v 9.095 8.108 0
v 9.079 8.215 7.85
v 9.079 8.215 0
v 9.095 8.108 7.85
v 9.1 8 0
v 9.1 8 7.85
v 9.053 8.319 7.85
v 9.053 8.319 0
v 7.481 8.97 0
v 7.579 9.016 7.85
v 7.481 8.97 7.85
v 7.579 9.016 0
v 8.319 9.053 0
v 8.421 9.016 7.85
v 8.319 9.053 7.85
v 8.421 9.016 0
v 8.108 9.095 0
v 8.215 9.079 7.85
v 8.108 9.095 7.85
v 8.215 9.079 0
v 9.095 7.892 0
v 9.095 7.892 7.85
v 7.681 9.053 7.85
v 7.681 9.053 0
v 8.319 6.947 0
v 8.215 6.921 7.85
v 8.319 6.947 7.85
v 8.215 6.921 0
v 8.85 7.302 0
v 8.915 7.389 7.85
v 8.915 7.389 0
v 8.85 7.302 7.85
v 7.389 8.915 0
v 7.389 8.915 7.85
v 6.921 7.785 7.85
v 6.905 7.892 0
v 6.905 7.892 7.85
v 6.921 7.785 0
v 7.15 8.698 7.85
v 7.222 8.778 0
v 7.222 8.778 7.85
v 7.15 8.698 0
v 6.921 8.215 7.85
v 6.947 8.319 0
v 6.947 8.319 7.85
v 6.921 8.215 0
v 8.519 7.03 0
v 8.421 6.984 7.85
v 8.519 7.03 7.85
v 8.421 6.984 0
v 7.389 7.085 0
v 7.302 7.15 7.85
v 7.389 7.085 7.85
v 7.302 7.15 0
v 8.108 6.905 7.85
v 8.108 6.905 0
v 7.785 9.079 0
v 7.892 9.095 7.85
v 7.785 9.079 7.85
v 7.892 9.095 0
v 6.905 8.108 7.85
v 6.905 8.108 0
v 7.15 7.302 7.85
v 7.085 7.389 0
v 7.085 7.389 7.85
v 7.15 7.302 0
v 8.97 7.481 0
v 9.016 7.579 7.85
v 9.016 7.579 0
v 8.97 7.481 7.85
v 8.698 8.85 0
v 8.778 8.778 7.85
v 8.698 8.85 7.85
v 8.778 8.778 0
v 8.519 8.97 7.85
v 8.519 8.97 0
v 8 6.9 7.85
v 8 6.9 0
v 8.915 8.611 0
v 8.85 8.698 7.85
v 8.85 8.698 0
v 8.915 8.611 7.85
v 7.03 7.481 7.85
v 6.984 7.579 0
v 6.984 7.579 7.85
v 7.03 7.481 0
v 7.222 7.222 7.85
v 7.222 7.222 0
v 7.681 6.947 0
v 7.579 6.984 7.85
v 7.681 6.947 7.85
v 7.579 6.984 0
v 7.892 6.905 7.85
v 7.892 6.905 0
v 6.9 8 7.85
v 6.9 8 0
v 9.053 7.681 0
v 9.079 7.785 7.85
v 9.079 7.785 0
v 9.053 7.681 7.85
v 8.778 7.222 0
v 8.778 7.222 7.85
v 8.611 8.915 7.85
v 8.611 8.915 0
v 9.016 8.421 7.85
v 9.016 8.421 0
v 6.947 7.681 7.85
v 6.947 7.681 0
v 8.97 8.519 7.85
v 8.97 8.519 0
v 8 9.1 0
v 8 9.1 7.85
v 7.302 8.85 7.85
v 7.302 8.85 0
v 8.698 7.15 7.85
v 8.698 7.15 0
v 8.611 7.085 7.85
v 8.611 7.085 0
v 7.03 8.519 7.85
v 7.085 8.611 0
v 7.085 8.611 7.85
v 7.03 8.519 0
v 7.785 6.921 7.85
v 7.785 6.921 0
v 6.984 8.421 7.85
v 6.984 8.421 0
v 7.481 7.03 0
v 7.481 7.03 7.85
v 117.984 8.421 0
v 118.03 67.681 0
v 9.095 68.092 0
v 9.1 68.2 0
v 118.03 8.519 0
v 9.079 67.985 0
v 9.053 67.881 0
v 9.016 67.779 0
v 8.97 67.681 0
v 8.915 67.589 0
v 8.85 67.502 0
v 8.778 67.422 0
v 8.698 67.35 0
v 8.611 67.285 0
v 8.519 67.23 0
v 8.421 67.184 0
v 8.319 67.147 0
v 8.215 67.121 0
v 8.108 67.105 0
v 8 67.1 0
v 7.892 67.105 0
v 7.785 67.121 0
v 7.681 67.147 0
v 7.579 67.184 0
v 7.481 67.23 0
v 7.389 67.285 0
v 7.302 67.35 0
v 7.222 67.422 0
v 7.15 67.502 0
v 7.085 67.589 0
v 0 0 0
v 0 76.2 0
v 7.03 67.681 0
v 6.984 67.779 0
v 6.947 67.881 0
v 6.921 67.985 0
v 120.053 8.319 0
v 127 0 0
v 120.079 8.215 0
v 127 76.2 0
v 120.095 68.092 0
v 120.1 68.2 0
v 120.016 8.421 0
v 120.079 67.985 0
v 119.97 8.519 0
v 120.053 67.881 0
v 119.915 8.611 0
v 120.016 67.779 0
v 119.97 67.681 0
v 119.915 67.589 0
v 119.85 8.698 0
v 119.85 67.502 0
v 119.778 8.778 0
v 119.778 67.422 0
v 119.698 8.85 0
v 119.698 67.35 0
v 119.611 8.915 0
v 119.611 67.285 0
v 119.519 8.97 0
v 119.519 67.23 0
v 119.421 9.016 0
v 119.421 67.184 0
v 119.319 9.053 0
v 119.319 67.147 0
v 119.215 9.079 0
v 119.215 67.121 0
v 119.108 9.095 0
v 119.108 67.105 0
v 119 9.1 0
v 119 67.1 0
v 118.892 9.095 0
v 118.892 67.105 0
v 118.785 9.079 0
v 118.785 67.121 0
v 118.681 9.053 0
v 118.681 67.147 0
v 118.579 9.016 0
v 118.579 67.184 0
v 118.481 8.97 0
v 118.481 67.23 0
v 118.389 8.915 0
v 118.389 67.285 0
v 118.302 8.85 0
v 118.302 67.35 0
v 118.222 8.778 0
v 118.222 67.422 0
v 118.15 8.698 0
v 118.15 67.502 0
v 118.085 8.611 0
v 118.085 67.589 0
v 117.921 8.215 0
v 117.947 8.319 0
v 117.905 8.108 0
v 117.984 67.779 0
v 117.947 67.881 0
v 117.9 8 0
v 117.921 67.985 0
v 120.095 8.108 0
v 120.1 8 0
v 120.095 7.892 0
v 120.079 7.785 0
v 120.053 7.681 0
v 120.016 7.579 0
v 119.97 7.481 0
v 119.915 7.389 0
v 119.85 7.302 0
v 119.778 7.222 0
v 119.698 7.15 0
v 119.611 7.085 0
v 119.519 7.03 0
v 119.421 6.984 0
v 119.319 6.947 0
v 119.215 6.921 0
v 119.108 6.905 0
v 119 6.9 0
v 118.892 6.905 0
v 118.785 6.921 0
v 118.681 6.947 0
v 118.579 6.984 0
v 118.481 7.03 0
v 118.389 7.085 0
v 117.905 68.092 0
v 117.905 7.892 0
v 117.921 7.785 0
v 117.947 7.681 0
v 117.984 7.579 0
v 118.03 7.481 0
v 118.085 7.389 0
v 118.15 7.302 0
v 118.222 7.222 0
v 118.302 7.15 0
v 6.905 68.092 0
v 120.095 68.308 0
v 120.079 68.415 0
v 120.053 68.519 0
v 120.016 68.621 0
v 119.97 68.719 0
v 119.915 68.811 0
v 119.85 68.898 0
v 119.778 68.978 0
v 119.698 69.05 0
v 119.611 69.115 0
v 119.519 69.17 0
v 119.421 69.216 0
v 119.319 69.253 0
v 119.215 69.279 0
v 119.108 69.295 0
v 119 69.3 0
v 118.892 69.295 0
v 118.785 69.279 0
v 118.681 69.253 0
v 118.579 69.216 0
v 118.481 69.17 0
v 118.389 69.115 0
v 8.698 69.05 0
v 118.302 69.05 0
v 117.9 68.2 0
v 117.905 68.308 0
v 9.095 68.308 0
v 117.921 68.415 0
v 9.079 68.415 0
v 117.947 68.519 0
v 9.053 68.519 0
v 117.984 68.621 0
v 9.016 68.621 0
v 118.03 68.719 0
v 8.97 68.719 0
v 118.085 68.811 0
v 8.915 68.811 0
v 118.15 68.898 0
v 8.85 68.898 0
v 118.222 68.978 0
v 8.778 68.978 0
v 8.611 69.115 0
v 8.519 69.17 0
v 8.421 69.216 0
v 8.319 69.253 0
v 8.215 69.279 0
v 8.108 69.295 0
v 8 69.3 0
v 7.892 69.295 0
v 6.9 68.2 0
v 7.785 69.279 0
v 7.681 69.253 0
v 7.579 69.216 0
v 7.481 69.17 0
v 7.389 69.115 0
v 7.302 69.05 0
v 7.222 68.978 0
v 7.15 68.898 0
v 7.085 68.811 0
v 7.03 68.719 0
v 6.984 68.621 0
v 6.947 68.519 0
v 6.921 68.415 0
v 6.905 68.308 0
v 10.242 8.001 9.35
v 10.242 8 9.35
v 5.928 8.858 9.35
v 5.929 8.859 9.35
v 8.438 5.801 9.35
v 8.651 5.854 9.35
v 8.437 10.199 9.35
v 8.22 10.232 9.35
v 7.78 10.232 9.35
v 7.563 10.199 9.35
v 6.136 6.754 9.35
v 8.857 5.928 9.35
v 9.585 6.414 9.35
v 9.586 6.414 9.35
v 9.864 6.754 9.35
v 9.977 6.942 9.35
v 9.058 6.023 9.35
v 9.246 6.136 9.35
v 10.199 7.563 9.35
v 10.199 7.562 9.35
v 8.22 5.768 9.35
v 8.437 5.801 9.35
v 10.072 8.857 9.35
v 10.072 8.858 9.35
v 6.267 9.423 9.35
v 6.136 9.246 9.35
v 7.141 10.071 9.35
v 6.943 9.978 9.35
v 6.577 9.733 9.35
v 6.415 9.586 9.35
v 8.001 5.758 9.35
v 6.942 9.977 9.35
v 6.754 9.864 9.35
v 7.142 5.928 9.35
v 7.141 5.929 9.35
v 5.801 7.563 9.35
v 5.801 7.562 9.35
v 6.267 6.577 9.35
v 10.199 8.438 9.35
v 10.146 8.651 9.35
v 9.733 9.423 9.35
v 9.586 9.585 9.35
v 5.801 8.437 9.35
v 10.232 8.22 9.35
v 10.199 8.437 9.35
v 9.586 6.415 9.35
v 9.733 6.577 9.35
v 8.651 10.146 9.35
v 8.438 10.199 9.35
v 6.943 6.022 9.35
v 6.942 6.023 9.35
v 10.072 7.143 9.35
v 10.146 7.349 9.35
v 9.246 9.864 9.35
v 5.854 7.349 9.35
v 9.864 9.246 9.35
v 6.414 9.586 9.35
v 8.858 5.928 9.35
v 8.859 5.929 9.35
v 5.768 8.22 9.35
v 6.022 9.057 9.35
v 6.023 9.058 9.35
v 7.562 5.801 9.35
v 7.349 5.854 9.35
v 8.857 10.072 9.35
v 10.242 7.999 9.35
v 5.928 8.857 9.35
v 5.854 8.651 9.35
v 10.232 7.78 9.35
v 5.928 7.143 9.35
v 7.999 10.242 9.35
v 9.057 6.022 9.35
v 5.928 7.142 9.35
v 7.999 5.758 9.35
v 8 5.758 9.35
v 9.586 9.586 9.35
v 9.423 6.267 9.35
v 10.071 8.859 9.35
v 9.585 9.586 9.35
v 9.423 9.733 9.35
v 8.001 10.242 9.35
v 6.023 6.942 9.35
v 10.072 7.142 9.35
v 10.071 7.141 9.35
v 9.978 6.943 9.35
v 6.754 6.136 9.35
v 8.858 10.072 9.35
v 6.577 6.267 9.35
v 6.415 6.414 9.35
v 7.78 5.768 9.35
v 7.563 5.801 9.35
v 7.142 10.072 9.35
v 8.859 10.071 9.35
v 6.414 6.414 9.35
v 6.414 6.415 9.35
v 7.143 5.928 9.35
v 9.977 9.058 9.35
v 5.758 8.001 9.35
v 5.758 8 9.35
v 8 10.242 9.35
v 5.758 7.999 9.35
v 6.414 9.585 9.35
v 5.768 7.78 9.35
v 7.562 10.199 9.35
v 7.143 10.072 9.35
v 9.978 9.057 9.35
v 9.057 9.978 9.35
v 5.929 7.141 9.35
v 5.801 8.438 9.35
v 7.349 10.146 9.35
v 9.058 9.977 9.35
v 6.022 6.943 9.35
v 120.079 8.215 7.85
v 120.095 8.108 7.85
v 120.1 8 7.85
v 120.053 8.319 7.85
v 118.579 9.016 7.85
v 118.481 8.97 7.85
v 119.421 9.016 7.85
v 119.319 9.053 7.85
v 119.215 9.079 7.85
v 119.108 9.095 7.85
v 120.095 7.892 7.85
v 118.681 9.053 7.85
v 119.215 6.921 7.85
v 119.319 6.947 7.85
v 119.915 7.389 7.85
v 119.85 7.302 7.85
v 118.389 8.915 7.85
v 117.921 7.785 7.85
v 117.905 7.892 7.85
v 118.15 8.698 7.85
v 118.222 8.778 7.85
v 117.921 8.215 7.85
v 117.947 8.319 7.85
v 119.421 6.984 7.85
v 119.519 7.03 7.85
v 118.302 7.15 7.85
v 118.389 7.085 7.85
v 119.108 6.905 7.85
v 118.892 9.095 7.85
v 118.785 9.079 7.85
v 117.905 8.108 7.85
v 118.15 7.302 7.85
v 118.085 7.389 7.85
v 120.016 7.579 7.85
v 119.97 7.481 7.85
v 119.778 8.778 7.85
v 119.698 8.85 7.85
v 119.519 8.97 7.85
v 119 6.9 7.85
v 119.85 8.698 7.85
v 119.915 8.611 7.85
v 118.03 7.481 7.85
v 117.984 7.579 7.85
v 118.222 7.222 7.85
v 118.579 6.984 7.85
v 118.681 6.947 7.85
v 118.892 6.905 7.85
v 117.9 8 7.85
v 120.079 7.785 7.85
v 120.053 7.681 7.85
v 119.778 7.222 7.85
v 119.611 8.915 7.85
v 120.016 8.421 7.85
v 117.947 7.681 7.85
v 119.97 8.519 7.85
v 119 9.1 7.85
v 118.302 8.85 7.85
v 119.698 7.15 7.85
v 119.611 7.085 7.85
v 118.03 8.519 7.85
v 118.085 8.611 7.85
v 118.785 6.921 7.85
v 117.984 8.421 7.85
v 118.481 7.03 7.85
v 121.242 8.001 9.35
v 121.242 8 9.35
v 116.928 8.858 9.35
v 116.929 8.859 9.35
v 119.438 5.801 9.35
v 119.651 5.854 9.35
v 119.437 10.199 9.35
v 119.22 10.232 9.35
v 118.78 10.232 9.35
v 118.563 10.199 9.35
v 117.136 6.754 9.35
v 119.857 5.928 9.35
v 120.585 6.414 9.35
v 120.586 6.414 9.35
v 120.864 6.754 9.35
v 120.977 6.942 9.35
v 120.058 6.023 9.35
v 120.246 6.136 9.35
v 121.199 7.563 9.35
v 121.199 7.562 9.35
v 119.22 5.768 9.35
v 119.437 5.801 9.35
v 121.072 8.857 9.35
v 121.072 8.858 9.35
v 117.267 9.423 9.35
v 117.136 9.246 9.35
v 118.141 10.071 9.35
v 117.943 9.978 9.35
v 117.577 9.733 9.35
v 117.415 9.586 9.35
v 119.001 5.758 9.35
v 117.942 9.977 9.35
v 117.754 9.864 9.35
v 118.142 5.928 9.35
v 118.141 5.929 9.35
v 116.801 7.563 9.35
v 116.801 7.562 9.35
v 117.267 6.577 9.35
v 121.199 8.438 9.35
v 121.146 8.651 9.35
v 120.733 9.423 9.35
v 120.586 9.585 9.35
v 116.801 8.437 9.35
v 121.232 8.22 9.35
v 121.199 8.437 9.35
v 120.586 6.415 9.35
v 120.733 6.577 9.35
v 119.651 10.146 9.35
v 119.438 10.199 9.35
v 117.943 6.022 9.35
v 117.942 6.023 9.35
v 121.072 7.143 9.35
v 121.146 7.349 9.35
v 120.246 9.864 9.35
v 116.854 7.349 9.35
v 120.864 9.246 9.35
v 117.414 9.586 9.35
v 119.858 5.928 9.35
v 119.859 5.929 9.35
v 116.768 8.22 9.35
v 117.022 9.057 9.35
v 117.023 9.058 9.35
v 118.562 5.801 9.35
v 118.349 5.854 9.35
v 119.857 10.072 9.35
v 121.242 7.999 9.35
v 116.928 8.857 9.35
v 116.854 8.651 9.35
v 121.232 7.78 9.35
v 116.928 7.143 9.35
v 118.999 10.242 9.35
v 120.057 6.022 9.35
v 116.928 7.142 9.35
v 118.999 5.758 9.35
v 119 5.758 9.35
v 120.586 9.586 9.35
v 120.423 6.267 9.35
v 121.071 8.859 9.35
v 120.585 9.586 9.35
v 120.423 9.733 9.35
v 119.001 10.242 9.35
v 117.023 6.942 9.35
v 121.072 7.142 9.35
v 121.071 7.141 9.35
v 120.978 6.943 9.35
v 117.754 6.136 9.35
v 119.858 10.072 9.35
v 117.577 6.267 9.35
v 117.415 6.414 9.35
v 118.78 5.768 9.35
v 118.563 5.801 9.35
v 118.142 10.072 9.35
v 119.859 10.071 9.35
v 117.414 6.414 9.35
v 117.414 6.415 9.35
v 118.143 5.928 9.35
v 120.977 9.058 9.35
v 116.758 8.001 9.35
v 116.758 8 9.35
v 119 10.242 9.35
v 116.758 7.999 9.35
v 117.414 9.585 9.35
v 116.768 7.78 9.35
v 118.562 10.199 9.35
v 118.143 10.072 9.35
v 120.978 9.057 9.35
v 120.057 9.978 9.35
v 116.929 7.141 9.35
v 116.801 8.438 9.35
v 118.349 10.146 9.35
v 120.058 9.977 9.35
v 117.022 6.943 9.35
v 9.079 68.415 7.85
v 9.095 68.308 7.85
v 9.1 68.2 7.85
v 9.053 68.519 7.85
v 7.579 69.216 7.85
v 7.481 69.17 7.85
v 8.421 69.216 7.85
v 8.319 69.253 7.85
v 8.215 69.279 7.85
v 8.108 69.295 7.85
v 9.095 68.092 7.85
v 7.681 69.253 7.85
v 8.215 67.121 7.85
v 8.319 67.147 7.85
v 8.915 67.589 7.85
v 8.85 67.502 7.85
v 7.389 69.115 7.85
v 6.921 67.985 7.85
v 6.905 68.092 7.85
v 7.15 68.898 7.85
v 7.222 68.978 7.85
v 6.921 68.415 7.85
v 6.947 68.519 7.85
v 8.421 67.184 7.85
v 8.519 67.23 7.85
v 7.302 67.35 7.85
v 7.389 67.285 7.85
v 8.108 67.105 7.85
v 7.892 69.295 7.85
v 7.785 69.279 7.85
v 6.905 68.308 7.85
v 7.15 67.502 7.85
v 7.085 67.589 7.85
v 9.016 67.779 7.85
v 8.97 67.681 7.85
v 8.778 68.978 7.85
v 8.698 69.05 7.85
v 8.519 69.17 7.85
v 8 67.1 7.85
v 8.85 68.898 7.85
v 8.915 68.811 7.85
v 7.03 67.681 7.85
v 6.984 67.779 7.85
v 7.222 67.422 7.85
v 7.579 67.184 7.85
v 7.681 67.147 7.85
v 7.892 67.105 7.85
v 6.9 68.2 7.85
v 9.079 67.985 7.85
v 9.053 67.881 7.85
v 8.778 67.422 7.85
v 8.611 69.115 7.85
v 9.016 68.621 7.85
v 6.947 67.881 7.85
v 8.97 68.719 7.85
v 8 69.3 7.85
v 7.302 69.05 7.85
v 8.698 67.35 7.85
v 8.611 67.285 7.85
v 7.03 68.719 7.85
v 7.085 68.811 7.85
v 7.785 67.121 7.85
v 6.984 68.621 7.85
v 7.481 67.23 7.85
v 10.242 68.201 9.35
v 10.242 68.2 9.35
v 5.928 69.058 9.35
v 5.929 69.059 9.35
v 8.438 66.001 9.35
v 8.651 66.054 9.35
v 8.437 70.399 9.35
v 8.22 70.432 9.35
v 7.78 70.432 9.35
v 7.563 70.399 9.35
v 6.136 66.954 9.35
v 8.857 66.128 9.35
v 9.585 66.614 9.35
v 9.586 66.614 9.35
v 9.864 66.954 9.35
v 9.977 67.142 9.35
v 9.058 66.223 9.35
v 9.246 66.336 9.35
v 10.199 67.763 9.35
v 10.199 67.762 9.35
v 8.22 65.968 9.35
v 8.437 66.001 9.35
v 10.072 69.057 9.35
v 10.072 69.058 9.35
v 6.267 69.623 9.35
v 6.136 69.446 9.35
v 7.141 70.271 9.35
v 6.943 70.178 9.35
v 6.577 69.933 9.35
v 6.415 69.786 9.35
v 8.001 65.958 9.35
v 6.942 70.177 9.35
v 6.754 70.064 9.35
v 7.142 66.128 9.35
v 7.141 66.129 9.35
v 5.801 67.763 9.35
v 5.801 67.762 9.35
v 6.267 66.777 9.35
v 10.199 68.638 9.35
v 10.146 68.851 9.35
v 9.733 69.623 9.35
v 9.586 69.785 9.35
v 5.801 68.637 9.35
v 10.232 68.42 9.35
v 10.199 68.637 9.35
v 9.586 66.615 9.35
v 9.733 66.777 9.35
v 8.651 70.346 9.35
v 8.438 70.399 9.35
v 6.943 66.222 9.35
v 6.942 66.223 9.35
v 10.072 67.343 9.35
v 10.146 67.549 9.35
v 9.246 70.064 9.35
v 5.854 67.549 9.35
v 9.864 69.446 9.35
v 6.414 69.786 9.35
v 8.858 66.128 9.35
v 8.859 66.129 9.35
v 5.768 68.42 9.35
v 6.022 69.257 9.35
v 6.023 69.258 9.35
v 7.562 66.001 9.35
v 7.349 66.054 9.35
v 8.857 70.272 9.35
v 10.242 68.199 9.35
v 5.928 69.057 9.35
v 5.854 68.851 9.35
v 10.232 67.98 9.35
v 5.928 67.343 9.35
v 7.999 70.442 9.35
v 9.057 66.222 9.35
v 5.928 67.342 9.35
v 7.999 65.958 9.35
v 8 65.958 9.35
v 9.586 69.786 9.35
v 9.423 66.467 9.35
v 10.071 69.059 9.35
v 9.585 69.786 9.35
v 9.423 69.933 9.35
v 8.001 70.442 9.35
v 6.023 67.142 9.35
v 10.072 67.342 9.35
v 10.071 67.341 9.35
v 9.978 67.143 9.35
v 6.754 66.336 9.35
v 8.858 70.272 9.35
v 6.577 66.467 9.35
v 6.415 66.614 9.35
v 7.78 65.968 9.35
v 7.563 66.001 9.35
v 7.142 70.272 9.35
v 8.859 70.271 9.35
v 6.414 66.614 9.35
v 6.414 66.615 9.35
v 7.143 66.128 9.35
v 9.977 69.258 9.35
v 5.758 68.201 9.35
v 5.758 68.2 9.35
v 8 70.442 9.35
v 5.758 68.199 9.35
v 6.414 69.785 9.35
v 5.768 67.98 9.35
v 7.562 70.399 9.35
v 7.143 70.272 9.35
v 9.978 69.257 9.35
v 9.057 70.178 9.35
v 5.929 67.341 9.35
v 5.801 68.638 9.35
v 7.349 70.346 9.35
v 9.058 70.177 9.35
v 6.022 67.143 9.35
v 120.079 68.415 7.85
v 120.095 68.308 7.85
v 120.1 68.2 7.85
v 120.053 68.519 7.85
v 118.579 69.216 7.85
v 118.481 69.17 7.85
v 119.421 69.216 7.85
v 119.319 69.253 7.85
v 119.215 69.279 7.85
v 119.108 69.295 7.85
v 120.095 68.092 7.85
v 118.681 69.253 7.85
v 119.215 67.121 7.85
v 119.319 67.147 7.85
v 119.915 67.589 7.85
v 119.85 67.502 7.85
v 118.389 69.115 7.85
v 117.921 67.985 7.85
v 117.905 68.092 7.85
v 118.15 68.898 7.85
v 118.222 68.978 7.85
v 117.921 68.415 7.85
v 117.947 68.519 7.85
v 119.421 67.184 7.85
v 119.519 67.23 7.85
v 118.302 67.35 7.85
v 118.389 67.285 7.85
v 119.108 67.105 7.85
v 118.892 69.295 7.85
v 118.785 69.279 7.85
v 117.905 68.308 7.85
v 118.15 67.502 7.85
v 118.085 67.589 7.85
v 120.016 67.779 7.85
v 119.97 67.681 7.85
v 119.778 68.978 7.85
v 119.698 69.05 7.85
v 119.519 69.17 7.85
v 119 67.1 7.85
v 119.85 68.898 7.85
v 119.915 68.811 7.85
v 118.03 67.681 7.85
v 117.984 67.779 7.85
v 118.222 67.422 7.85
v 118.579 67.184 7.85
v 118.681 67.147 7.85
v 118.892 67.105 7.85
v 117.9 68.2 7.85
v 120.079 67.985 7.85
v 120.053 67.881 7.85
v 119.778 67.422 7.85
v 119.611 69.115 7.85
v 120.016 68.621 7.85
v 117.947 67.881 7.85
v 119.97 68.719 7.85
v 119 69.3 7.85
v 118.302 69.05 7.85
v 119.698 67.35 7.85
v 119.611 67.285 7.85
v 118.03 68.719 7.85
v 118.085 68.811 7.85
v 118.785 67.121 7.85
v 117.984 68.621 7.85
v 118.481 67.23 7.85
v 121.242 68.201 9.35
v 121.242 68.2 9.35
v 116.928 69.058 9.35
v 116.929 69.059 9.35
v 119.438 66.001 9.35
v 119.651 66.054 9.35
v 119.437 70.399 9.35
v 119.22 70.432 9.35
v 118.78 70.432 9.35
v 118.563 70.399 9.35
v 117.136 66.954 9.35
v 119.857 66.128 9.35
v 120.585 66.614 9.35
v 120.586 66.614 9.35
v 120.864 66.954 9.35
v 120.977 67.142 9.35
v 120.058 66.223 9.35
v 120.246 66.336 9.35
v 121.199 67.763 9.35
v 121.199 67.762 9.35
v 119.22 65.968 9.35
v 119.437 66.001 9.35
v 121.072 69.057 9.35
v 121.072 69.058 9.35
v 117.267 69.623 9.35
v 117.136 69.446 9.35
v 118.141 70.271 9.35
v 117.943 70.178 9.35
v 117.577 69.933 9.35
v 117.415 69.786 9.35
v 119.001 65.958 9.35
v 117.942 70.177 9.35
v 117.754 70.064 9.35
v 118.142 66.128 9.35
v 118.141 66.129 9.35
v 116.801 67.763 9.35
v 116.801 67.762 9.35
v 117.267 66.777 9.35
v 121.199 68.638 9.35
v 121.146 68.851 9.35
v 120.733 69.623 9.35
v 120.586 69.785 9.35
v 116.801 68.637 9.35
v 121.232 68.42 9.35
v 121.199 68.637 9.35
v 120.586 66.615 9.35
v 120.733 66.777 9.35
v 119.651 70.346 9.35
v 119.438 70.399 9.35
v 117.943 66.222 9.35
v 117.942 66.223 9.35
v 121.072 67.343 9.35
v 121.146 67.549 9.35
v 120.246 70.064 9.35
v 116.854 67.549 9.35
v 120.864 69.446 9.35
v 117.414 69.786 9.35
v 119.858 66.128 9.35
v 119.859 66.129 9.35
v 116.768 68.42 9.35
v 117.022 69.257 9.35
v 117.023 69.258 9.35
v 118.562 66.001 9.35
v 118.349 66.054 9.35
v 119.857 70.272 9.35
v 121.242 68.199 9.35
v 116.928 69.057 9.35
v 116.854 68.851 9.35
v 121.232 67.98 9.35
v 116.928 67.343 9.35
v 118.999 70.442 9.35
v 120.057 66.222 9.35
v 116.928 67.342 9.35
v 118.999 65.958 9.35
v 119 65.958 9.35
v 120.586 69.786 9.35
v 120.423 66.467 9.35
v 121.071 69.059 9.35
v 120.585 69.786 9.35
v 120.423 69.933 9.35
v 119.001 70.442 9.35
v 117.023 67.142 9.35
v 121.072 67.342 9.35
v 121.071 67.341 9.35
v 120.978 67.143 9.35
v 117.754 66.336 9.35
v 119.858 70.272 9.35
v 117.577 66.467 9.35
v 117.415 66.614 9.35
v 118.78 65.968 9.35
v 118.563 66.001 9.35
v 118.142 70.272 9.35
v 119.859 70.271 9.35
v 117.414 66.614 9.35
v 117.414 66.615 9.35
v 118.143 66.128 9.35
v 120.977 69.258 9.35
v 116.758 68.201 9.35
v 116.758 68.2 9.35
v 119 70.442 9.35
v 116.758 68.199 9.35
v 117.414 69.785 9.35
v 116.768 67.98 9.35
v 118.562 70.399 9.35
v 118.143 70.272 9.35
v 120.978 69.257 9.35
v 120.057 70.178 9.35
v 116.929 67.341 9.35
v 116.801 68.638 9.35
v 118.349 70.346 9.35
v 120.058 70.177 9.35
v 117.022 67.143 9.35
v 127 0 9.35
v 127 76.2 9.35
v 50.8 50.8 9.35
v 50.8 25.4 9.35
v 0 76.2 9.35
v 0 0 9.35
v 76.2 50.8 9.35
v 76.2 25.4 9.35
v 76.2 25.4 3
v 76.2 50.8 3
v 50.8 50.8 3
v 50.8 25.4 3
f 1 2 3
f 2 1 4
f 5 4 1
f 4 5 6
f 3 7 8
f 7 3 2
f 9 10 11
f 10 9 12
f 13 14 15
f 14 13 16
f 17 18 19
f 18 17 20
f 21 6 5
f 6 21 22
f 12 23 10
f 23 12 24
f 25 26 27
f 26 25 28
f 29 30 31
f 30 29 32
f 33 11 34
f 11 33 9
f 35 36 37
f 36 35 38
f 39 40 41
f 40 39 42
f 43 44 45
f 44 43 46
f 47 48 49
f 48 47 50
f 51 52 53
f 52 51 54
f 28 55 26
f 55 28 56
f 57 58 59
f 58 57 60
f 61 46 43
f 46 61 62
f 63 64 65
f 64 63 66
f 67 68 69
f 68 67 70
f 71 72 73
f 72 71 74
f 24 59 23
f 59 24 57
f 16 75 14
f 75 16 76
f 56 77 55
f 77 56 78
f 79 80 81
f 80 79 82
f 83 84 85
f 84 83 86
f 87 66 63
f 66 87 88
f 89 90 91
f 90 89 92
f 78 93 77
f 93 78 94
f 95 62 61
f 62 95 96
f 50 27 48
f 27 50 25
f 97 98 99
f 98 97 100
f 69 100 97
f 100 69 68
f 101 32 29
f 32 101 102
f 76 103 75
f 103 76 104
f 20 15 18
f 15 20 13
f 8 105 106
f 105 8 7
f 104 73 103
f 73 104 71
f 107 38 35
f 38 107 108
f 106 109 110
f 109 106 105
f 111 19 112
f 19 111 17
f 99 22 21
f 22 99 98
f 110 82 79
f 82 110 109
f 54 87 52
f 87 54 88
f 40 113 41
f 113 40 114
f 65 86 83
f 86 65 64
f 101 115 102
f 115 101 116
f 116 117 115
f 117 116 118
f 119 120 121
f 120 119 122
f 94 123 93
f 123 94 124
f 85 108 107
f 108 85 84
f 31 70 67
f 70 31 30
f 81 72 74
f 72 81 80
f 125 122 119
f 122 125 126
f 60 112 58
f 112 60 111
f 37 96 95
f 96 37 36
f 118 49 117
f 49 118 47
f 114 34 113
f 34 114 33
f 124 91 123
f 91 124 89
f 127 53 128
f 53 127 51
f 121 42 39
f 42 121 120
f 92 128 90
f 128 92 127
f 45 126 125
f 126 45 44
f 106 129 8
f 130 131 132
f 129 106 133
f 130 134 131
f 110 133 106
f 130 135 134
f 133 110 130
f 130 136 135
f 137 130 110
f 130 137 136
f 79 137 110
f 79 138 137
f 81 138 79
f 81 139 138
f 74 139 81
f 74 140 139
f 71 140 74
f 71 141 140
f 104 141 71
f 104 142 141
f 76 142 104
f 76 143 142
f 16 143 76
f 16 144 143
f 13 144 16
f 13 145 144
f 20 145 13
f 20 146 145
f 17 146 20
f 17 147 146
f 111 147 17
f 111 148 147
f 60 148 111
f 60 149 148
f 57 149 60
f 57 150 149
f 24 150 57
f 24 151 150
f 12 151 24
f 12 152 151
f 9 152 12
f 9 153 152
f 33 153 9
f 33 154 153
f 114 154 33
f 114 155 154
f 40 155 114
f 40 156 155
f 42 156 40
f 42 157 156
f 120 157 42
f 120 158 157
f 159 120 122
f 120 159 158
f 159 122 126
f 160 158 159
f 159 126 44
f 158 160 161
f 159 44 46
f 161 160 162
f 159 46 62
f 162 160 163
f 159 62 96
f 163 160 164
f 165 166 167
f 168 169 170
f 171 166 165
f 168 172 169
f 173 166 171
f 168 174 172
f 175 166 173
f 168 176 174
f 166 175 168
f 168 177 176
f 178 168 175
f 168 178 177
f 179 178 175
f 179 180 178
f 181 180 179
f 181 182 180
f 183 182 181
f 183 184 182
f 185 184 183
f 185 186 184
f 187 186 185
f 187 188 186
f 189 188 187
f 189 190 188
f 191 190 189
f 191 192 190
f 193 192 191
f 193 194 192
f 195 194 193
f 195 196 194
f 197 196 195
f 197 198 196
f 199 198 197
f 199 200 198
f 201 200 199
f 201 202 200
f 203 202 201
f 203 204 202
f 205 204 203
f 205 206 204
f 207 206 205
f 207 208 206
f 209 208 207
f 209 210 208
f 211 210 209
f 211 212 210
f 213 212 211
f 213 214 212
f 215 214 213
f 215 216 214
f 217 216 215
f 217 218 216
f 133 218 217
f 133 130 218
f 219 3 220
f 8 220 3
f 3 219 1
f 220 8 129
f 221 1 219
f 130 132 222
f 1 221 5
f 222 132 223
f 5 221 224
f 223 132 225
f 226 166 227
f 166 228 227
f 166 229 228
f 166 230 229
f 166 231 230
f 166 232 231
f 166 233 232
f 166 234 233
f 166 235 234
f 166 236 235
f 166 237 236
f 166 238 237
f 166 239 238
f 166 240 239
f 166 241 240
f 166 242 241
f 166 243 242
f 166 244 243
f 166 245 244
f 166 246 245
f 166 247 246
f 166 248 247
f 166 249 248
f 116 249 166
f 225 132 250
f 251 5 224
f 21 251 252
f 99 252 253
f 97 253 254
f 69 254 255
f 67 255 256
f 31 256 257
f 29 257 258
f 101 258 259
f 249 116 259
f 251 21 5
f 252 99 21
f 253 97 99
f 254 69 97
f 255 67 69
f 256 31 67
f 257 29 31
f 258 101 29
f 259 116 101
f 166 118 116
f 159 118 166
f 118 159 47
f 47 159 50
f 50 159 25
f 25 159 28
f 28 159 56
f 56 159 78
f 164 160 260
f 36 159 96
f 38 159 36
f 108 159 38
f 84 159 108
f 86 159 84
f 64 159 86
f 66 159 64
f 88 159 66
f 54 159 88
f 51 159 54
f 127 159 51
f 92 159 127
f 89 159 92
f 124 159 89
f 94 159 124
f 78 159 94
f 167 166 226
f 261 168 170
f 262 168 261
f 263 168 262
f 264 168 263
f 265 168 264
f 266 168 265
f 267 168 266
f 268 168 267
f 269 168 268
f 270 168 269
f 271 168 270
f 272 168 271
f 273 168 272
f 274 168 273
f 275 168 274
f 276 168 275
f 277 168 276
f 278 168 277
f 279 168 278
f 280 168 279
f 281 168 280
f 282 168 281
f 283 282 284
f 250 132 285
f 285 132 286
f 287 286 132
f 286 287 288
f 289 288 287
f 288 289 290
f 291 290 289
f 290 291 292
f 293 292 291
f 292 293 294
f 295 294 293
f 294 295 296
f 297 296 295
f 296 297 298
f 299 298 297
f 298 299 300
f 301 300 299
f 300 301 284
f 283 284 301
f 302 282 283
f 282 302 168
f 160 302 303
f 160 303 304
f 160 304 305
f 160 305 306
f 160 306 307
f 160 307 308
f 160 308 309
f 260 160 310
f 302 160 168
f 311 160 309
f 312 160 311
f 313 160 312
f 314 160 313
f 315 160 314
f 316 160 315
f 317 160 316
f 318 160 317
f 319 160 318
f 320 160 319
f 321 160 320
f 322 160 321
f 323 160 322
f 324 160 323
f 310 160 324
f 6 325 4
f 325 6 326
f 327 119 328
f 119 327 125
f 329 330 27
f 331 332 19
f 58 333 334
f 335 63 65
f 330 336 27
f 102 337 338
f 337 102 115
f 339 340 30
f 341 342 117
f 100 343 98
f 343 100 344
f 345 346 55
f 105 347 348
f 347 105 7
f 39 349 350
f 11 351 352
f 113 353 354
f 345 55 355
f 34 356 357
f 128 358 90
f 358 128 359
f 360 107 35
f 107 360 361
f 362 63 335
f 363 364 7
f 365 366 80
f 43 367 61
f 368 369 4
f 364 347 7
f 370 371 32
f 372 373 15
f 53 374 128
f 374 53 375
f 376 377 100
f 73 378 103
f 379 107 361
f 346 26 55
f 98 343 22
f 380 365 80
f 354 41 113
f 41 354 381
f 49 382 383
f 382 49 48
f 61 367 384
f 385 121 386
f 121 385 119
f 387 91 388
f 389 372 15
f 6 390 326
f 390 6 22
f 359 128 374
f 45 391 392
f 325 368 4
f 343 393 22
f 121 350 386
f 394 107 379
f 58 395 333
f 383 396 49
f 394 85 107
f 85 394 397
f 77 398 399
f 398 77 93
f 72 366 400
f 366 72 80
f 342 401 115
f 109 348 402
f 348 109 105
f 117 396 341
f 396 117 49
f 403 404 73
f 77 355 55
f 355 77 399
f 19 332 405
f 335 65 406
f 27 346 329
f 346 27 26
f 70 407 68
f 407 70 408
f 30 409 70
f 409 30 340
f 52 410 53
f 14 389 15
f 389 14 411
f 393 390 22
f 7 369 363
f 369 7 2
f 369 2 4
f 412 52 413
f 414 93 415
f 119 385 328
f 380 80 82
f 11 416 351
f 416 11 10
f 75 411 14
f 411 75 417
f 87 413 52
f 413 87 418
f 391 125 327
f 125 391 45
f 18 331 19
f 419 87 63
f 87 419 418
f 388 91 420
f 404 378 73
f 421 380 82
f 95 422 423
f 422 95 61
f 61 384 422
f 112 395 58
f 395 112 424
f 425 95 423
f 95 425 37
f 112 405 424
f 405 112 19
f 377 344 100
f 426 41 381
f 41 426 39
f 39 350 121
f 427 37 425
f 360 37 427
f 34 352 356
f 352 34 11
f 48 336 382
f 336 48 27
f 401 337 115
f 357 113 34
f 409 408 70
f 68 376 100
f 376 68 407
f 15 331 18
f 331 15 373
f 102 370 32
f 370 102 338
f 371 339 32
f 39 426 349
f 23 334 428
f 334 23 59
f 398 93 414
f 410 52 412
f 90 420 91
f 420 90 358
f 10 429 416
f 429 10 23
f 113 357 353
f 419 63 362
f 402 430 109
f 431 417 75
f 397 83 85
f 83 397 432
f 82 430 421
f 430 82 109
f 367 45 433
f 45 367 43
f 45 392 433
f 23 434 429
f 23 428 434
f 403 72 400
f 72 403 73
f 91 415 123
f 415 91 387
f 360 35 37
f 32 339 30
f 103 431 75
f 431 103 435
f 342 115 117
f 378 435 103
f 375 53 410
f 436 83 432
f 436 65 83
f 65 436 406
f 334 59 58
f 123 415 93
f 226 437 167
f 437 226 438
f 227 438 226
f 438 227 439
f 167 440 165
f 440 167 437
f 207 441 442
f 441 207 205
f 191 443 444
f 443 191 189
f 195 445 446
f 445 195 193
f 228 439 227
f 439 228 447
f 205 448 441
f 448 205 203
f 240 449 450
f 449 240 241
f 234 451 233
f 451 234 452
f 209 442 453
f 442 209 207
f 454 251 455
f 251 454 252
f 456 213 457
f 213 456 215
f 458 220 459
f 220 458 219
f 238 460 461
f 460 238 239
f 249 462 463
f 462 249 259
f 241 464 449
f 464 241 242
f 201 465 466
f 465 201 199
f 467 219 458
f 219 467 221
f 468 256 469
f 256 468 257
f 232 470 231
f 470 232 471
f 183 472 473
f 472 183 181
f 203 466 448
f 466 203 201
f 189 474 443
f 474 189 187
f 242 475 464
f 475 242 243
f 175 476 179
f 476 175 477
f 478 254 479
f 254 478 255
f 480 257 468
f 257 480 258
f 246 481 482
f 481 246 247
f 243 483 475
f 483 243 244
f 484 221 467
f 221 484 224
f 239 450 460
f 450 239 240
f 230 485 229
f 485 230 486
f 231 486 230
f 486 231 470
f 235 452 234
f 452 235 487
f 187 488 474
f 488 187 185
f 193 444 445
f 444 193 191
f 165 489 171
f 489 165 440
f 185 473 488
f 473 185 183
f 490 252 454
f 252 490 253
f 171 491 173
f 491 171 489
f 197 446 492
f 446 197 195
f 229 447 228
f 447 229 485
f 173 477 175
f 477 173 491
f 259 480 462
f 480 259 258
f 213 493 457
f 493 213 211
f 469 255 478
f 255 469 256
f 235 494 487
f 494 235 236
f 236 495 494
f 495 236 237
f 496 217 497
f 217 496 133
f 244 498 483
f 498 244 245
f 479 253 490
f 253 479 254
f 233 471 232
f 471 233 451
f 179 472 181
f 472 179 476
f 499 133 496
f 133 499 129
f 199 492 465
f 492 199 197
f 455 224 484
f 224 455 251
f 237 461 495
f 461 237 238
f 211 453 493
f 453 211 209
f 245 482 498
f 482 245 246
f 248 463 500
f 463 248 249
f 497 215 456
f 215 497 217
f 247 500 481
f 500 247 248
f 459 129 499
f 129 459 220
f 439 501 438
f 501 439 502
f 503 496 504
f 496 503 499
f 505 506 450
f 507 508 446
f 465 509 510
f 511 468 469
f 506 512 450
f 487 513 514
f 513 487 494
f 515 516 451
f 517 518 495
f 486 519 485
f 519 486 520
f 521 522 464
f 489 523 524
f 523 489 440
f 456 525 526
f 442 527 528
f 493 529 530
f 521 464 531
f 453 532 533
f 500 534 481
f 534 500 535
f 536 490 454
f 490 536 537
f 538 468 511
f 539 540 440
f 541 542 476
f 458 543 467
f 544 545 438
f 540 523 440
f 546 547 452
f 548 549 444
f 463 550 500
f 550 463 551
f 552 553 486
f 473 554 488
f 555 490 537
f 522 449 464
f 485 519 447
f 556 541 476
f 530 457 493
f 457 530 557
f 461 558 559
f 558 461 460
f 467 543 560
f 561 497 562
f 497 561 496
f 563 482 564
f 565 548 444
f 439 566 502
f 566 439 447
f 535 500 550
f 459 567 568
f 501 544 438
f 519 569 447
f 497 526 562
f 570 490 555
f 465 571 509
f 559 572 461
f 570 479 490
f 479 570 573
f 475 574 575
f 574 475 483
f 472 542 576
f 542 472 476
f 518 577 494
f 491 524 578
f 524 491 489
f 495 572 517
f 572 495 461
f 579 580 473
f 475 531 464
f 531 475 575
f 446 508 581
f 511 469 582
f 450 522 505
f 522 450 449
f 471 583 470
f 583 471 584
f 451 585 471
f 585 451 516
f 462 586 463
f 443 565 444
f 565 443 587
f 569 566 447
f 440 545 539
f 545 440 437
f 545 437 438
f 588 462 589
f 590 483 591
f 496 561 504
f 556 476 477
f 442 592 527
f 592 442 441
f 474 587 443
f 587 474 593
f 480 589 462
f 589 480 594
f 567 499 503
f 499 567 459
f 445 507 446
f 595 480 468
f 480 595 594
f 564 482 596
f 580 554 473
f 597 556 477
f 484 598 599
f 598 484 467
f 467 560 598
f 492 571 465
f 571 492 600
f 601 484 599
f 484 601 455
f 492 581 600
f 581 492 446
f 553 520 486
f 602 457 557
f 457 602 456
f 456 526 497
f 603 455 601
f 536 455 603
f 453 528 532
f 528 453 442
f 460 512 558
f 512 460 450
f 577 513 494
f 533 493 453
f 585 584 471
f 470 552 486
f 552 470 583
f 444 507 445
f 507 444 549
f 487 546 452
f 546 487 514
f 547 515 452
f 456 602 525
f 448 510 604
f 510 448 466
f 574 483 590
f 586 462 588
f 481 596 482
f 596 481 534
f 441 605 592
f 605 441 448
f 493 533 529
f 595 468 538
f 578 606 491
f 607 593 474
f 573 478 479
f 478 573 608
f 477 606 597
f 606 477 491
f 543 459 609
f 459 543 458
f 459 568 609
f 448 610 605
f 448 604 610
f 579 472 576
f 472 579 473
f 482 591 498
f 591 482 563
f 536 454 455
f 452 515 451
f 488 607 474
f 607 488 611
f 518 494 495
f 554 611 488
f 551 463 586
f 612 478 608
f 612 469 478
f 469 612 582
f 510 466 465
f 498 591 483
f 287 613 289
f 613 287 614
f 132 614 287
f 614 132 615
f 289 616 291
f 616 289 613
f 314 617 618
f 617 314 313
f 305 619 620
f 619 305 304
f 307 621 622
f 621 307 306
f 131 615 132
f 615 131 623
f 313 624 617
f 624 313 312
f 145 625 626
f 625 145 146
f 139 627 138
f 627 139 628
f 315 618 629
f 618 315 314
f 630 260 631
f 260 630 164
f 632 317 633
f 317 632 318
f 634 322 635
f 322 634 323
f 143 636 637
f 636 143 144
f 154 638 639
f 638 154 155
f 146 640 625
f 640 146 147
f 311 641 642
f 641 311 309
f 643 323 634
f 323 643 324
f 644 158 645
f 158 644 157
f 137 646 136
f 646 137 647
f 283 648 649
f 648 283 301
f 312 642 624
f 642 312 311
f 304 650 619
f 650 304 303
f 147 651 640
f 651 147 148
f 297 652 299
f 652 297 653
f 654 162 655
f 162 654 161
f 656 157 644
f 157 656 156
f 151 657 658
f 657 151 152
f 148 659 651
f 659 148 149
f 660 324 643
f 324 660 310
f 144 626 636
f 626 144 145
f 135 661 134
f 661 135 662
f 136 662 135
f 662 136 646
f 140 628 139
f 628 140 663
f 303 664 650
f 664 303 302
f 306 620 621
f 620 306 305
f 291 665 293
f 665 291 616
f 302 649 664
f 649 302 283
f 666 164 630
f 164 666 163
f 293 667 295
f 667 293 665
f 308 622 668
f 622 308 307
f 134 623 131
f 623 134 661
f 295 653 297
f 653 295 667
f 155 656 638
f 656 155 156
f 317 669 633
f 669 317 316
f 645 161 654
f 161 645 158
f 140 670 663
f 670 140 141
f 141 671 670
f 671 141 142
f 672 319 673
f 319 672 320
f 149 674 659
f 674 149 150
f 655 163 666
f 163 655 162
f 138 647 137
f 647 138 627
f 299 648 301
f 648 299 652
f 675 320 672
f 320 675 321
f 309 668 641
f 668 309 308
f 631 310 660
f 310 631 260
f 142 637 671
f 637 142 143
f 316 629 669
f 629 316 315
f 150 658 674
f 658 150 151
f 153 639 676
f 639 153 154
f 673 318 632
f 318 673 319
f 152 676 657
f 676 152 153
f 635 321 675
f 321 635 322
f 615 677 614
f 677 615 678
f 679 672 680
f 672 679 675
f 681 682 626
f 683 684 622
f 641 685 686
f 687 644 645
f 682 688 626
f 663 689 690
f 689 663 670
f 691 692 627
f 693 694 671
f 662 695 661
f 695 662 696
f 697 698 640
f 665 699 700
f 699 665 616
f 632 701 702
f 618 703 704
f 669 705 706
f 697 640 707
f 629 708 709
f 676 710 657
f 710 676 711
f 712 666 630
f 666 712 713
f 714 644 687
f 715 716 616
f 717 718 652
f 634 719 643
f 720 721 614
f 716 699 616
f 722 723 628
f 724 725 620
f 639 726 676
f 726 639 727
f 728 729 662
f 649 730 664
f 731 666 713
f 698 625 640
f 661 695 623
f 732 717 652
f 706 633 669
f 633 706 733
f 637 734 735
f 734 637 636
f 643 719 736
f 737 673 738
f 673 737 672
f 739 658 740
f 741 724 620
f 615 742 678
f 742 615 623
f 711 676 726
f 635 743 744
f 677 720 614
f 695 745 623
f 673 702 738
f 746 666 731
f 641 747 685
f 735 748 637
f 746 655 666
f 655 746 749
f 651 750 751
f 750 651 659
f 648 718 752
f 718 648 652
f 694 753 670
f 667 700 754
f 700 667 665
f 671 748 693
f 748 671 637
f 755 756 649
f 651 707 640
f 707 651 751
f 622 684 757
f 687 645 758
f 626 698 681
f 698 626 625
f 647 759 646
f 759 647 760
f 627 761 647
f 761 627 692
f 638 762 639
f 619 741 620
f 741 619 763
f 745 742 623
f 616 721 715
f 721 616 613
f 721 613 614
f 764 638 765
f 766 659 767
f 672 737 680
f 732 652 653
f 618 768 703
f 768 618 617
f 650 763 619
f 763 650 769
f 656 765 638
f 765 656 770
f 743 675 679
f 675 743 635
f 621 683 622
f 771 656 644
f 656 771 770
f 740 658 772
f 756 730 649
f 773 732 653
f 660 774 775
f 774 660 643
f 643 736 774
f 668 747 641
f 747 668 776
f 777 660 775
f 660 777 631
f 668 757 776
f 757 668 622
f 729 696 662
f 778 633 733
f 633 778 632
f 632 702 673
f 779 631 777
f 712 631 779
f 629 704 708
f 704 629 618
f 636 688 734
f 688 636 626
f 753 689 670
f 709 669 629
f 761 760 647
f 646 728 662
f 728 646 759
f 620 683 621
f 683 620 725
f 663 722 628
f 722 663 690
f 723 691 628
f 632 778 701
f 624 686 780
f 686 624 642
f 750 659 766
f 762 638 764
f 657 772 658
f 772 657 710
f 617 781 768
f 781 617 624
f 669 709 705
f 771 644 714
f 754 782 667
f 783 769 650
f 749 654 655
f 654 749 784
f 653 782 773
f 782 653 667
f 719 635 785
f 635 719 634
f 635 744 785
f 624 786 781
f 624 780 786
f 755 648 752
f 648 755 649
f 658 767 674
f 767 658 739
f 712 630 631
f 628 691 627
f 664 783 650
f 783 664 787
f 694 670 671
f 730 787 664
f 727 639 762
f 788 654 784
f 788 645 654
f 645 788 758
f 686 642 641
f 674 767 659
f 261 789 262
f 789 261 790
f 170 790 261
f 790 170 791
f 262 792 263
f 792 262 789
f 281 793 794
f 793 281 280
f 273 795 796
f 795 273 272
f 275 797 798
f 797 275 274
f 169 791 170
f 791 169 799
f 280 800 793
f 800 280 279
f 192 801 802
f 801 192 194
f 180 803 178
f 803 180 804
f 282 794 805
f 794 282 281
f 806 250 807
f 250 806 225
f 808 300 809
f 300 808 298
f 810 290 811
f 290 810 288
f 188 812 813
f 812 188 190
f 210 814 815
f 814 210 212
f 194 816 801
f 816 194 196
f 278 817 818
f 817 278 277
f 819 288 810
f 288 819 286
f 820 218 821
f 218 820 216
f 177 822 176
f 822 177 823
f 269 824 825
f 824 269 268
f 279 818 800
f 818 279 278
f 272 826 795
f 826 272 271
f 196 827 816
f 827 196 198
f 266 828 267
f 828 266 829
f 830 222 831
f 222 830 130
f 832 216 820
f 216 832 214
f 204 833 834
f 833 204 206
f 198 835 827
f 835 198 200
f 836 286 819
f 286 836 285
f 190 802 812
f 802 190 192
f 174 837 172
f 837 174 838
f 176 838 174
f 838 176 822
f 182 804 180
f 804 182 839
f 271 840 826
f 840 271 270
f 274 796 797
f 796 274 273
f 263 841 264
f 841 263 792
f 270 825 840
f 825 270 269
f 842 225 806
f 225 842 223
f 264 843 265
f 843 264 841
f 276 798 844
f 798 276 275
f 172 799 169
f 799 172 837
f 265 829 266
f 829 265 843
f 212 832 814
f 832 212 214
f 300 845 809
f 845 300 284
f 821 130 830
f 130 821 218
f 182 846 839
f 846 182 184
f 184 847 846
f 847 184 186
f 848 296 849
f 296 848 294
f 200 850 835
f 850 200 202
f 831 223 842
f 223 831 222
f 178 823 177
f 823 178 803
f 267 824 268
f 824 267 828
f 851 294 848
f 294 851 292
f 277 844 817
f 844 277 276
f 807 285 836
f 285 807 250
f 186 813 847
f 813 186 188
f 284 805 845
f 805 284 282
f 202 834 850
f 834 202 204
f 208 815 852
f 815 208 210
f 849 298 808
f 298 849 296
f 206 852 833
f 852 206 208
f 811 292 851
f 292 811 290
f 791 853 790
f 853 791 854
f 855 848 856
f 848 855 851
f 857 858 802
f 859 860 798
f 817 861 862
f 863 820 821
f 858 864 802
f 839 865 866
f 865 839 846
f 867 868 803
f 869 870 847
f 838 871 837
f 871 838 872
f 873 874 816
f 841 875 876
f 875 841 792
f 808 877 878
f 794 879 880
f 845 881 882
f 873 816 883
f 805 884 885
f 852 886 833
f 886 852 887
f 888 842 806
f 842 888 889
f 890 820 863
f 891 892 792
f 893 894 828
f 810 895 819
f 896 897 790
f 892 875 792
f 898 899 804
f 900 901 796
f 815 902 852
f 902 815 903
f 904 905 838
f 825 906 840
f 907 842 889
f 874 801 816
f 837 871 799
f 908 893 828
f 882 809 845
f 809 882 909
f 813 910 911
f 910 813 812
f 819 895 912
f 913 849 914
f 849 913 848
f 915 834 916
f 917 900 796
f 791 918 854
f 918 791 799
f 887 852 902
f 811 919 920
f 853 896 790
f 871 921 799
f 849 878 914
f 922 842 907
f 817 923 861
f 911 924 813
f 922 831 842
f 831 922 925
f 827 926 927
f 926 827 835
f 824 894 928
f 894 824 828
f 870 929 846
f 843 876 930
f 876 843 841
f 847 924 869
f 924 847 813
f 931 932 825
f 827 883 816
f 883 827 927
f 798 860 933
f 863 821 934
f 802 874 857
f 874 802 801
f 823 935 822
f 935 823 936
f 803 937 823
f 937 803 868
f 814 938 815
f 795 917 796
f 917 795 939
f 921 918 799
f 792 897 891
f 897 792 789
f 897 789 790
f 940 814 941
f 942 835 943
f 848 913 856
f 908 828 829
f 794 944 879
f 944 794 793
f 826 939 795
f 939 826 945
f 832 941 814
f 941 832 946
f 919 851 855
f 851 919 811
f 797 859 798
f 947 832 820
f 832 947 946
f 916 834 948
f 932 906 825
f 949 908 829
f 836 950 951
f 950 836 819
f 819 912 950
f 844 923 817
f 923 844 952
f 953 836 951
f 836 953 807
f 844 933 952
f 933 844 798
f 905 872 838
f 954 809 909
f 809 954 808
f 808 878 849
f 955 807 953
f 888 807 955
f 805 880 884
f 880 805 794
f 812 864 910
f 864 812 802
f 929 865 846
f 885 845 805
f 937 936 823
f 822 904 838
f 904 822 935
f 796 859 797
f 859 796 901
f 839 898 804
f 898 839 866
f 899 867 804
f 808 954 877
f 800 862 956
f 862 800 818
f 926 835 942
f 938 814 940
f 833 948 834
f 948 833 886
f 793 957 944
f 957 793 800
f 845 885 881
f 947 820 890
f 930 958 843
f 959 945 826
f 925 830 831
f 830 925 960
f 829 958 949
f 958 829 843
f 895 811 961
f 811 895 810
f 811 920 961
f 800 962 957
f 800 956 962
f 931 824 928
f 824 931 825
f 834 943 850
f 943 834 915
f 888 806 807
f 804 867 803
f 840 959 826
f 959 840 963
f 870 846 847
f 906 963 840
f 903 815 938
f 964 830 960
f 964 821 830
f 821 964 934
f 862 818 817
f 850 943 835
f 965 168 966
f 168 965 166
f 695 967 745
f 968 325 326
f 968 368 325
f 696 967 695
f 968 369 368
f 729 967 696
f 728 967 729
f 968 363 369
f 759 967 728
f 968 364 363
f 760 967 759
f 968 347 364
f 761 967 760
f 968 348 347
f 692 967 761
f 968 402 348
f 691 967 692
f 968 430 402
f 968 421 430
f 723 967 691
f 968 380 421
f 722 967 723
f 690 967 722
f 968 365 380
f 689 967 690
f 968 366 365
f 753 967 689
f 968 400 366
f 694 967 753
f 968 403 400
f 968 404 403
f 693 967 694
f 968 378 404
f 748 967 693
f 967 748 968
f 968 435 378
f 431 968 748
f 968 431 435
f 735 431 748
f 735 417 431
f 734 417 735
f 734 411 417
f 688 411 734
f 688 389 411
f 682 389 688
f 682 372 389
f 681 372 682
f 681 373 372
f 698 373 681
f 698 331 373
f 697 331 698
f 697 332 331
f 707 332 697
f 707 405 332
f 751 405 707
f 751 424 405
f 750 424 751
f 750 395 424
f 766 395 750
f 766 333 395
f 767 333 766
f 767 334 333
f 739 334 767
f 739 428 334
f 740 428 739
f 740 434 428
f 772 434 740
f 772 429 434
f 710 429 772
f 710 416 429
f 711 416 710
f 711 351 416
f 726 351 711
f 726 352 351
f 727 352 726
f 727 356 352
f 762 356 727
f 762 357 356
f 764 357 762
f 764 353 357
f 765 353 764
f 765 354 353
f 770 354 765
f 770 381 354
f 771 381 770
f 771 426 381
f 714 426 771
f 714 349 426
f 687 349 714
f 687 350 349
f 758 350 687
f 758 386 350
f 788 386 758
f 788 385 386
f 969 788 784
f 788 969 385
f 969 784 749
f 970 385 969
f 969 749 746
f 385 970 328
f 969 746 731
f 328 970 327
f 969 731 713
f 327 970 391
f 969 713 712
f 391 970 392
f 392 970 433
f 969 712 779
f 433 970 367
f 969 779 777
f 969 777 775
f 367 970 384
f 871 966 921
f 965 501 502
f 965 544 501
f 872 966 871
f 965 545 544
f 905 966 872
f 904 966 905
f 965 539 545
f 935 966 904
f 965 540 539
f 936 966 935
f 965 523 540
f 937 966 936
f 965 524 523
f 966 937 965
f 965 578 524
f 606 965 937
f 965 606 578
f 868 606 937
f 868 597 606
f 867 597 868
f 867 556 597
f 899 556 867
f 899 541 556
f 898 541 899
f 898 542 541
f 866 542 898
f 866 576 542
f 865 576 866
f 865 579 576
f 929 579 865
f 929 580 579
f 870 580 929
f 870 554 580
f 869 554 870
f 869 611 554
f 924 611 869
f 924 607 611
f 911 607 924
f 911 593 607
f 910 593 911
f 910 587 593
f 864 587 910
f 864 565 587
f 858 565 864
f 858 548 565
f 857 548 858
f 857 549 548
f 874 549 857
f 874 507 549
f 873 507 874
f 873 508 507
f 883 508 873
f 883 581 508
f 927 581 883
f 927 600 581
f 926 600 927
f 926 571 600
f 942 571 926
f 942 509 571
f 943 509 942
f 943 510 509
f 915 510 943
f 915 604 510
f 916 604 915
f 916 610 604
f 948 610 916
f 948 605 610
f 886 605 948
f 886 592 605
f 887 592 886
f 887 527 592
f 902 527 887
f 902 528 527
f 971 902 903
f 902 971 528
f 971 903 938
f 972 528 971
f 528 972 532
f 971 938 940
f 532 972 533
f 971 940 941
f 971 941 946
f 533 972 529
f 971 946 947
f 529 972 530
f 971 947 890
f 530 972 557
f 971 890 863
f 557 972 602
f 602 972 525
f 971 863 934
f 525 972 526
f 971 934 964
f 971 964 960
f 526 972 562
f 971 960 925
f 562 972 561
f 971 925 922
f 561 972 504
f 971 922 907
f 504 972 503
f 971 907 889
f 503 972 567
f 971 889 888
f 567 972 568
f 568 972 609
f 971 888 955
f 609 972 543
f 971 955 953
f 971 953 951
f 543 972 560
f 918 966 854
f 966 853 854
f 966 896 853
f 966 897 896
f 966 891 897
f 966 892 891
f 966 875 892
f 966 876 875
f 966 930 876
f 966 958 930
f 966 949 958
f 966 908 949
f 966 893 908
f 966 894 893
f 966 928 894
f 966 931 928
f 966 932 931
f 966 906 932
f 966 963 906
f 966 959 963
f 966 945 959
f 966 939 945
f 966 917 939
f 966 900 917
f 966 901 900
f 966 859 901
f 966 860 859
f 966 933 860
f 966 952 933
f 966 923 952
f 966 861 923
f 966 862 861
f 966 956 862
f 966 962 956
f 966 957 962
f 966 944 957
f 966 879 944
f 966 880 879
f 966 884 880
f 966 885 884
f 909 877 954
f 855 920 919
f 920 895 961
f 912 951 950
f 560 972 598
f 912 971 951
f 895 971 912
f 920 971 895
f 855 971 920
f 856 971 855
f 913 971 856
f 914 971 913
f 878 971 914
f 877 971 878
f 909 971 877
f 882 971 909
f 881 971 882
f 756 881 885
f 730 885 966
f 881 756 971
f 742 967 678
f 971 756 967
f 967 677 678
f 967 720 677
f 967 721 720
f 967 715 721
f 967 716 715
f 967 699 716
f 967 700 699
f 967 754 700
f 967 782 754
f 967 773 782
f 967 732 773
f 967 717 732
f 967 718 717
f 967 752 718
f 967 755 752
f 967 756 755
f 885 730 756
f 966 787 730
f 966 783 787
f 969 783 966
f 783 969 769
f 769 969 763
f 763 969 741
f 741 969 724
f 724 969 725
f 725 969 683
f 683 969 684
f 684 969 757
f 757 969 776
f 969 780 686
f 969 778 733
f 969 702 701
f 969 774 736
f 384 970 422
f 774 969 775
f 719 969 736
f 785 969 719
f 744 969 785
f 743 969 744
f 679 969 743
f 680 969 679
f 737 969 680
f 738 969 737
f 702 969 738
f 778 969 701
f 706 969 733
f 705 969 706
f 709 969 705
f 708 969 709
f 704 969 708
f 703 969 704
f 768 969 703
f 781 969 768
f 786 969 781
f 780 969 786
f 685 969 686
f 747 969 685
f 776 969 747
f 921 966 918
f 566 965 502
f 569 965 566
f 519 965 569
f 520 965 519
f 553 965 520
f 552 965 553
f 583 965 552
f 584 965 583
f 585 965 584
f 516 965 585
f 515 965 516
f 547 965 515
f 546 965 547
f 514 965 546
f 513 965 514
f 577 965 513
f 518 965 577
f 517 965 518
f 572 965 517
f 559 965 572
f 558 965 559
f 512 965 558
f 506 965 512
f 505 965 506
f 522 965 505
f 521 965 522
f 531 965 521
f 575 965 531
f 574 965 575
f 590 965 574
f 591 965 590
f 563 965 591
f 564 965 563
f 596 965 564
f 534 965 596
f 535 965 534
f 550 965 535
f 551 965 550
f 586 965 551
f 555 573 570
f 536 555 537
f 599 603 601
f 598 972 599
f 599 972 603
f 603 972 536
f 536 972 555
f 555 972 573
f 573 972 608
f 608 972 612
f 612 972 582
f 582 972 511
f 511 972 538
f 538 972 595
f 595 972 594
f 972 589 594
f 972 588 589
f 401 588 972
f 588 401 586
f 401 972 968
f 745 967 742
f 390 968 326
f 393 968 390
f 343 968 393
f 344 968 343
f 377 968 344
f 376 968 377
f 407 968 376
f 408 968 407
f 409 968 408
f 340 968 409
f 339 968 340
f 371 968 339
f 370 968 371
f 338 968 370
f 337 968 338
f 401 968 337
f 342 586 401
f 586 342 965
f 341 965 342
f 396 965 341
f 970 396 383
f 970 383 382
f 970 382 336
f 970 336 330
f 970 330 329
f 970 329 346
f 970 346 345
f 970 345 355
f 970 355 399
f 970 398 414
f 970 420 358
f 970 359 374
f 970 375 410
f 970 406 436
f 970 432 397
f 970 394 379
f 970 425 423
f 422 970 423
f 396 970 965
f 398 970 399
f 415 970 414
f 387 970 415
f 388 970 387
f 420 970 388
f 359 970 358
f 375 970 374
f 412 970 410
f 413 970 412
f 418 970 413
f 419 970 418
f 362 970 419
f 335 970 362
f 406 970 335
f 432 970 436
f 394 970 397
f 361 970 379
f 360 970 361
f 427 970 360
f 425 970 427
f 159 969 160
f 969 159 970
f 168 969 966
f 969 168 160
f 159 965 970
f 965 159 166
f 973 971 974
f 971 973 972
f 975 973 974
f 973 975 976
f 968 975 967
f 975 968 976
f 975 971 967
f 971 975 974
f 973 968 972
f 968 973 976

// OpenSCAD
// file: params.scad
// =============================================================================
// imac-camera-rebirth — params.scad
// Shared parameters for all enclosure variants
// https://github.com/thisoldcpu/imac-camera-rebirth
// =============================================================================
// Module: Apple 820-2572-A (2009 iMac 27")
// =============================================================================

// -----------------------------------------------------------------------------
// PCB
// -----------------------------------------------------------------------------
pcb_l        = 50.00;   // length (X)
pcb_w        =  7.92;   // width (Y)
pcb_d        = 10.00;   // depth lens face to rear connector (Z)

// -----------------------------------------------------------------------------
// Lens barrel
// -----------------------------------------------------------------------------
lens_dia     =  7.50;   // barrel outer diameter
lens_x       = 25.00;   // center offset from PCB left edge (dead center)
lens_y       =  3.96;   // center offset from PCB bottom edge (PCB centerline)

// -----------------------------------------------------------------------------
// USB-C port cutout (rear, dead center)
// -----------------------------------------------------------------------------
usbc_w       =  9.00;   // USB-C receptacle width
usbc_h       =  3.26;   // USB-C receptacle height
usbc_x       = pcb_l / 2; // dead center on PCB length axis

// -----------------------------------------------------------------------------
// Wall and clearance
// -----------------------------------------------------------------------------
wall         =  2.00;   // minimum shell wall thickness
clearance    =  0.20;   // PCB pocket fit clearance (per side)
lens_clear   =  0.30;   // lens aperture clearance (radial)

// -----------------------------------------------------------------------------
// Derived — PCB pocket (do not edit)
// -----------------------------------------------------------------------------
pocket_l     = pcb_l + (clearance * 2);
pocket_w     = pcb_w + (clearance * 2);
pocket_d     = pcb_d + clearance;

// -----------------------------------------------------------------------------
// Obelisk body (top shell)
// -----------------------------------------------------------------------------
body_l       = pocket_l + (wall * 2);
body_w       = pocket_w + (wall * 2);
body_d       = pocket_d + wall;

// -----------------------------------------------------------------------------
// Top/bottom shell split
// -----------------------------------------------------------------------------
split_z      = body_d / 2;  // Z height of shell split plane

// -----------------------------------------------------------------------------
// Heatsink channel
// -----------------------------------------------------------------------------
hs_channel_w =  6.00;   // width of slim channel over HS pad
hs_channel_d =  1.00;   // depth of channel recess into top shell
// main file
// =============================================================================
// imac-camera-rebirth — obelisk_bottom.scad
// Bottom plate: 5"x3", blind center recess, chamfered M2 corner holes
// https://github.com/thisoldcpu/imac-camera-rebirth
// =============================================================================

include <params.scad>

$fn = 64;

ow         = 127.00;
od         =  76.20;
screw_in   =   8.00;

recess_w   =  25.40;  // 1"
recess_d   =  25.40;  // 1"
recess_h   =   6.35;  // 1/2" blind recess
wall_t     =   3.00;
plate_h    =  recess_h + wall_t;  // 9.35mm — recess + floor

chamfer_d  =   4.50;
chamfer_h  =   1.50;

module chamfered_hole(total_h) {
    cylinder(h=total_h, d=2.2);
    translate([0, 0, total_h - chamfer_h])
        cylinder(h=chamfer_h+0.01, d1=2.2, d2=chamfer_d);
}

module obelisk_bottom() {
    difference() {
        cube([ow, od, plate_h]);

        // Blind snap-in recess from top face down
        translate([ow/2 - recess_w/2, od/2 - recess_d/2, plate_h - recess_h])
            cube([recess_w, recess_d, recess_h + 0.01]);

        // Chamfered M2 holes
        translate([screw_in,    screw_in,    0]) chamfered_hole(plate_h);
        translate([ow-screw_in, screw_in,    0]) chamfered_hole(plate_h);
        translate([screw_in,    od-screw_in, 0]) chamfered_hole(plate_h);
        translate([ow-screw_in, od-screw_in, 0]) chamfered_hole(plate_h);
    }
}

obelisk_bottom();
